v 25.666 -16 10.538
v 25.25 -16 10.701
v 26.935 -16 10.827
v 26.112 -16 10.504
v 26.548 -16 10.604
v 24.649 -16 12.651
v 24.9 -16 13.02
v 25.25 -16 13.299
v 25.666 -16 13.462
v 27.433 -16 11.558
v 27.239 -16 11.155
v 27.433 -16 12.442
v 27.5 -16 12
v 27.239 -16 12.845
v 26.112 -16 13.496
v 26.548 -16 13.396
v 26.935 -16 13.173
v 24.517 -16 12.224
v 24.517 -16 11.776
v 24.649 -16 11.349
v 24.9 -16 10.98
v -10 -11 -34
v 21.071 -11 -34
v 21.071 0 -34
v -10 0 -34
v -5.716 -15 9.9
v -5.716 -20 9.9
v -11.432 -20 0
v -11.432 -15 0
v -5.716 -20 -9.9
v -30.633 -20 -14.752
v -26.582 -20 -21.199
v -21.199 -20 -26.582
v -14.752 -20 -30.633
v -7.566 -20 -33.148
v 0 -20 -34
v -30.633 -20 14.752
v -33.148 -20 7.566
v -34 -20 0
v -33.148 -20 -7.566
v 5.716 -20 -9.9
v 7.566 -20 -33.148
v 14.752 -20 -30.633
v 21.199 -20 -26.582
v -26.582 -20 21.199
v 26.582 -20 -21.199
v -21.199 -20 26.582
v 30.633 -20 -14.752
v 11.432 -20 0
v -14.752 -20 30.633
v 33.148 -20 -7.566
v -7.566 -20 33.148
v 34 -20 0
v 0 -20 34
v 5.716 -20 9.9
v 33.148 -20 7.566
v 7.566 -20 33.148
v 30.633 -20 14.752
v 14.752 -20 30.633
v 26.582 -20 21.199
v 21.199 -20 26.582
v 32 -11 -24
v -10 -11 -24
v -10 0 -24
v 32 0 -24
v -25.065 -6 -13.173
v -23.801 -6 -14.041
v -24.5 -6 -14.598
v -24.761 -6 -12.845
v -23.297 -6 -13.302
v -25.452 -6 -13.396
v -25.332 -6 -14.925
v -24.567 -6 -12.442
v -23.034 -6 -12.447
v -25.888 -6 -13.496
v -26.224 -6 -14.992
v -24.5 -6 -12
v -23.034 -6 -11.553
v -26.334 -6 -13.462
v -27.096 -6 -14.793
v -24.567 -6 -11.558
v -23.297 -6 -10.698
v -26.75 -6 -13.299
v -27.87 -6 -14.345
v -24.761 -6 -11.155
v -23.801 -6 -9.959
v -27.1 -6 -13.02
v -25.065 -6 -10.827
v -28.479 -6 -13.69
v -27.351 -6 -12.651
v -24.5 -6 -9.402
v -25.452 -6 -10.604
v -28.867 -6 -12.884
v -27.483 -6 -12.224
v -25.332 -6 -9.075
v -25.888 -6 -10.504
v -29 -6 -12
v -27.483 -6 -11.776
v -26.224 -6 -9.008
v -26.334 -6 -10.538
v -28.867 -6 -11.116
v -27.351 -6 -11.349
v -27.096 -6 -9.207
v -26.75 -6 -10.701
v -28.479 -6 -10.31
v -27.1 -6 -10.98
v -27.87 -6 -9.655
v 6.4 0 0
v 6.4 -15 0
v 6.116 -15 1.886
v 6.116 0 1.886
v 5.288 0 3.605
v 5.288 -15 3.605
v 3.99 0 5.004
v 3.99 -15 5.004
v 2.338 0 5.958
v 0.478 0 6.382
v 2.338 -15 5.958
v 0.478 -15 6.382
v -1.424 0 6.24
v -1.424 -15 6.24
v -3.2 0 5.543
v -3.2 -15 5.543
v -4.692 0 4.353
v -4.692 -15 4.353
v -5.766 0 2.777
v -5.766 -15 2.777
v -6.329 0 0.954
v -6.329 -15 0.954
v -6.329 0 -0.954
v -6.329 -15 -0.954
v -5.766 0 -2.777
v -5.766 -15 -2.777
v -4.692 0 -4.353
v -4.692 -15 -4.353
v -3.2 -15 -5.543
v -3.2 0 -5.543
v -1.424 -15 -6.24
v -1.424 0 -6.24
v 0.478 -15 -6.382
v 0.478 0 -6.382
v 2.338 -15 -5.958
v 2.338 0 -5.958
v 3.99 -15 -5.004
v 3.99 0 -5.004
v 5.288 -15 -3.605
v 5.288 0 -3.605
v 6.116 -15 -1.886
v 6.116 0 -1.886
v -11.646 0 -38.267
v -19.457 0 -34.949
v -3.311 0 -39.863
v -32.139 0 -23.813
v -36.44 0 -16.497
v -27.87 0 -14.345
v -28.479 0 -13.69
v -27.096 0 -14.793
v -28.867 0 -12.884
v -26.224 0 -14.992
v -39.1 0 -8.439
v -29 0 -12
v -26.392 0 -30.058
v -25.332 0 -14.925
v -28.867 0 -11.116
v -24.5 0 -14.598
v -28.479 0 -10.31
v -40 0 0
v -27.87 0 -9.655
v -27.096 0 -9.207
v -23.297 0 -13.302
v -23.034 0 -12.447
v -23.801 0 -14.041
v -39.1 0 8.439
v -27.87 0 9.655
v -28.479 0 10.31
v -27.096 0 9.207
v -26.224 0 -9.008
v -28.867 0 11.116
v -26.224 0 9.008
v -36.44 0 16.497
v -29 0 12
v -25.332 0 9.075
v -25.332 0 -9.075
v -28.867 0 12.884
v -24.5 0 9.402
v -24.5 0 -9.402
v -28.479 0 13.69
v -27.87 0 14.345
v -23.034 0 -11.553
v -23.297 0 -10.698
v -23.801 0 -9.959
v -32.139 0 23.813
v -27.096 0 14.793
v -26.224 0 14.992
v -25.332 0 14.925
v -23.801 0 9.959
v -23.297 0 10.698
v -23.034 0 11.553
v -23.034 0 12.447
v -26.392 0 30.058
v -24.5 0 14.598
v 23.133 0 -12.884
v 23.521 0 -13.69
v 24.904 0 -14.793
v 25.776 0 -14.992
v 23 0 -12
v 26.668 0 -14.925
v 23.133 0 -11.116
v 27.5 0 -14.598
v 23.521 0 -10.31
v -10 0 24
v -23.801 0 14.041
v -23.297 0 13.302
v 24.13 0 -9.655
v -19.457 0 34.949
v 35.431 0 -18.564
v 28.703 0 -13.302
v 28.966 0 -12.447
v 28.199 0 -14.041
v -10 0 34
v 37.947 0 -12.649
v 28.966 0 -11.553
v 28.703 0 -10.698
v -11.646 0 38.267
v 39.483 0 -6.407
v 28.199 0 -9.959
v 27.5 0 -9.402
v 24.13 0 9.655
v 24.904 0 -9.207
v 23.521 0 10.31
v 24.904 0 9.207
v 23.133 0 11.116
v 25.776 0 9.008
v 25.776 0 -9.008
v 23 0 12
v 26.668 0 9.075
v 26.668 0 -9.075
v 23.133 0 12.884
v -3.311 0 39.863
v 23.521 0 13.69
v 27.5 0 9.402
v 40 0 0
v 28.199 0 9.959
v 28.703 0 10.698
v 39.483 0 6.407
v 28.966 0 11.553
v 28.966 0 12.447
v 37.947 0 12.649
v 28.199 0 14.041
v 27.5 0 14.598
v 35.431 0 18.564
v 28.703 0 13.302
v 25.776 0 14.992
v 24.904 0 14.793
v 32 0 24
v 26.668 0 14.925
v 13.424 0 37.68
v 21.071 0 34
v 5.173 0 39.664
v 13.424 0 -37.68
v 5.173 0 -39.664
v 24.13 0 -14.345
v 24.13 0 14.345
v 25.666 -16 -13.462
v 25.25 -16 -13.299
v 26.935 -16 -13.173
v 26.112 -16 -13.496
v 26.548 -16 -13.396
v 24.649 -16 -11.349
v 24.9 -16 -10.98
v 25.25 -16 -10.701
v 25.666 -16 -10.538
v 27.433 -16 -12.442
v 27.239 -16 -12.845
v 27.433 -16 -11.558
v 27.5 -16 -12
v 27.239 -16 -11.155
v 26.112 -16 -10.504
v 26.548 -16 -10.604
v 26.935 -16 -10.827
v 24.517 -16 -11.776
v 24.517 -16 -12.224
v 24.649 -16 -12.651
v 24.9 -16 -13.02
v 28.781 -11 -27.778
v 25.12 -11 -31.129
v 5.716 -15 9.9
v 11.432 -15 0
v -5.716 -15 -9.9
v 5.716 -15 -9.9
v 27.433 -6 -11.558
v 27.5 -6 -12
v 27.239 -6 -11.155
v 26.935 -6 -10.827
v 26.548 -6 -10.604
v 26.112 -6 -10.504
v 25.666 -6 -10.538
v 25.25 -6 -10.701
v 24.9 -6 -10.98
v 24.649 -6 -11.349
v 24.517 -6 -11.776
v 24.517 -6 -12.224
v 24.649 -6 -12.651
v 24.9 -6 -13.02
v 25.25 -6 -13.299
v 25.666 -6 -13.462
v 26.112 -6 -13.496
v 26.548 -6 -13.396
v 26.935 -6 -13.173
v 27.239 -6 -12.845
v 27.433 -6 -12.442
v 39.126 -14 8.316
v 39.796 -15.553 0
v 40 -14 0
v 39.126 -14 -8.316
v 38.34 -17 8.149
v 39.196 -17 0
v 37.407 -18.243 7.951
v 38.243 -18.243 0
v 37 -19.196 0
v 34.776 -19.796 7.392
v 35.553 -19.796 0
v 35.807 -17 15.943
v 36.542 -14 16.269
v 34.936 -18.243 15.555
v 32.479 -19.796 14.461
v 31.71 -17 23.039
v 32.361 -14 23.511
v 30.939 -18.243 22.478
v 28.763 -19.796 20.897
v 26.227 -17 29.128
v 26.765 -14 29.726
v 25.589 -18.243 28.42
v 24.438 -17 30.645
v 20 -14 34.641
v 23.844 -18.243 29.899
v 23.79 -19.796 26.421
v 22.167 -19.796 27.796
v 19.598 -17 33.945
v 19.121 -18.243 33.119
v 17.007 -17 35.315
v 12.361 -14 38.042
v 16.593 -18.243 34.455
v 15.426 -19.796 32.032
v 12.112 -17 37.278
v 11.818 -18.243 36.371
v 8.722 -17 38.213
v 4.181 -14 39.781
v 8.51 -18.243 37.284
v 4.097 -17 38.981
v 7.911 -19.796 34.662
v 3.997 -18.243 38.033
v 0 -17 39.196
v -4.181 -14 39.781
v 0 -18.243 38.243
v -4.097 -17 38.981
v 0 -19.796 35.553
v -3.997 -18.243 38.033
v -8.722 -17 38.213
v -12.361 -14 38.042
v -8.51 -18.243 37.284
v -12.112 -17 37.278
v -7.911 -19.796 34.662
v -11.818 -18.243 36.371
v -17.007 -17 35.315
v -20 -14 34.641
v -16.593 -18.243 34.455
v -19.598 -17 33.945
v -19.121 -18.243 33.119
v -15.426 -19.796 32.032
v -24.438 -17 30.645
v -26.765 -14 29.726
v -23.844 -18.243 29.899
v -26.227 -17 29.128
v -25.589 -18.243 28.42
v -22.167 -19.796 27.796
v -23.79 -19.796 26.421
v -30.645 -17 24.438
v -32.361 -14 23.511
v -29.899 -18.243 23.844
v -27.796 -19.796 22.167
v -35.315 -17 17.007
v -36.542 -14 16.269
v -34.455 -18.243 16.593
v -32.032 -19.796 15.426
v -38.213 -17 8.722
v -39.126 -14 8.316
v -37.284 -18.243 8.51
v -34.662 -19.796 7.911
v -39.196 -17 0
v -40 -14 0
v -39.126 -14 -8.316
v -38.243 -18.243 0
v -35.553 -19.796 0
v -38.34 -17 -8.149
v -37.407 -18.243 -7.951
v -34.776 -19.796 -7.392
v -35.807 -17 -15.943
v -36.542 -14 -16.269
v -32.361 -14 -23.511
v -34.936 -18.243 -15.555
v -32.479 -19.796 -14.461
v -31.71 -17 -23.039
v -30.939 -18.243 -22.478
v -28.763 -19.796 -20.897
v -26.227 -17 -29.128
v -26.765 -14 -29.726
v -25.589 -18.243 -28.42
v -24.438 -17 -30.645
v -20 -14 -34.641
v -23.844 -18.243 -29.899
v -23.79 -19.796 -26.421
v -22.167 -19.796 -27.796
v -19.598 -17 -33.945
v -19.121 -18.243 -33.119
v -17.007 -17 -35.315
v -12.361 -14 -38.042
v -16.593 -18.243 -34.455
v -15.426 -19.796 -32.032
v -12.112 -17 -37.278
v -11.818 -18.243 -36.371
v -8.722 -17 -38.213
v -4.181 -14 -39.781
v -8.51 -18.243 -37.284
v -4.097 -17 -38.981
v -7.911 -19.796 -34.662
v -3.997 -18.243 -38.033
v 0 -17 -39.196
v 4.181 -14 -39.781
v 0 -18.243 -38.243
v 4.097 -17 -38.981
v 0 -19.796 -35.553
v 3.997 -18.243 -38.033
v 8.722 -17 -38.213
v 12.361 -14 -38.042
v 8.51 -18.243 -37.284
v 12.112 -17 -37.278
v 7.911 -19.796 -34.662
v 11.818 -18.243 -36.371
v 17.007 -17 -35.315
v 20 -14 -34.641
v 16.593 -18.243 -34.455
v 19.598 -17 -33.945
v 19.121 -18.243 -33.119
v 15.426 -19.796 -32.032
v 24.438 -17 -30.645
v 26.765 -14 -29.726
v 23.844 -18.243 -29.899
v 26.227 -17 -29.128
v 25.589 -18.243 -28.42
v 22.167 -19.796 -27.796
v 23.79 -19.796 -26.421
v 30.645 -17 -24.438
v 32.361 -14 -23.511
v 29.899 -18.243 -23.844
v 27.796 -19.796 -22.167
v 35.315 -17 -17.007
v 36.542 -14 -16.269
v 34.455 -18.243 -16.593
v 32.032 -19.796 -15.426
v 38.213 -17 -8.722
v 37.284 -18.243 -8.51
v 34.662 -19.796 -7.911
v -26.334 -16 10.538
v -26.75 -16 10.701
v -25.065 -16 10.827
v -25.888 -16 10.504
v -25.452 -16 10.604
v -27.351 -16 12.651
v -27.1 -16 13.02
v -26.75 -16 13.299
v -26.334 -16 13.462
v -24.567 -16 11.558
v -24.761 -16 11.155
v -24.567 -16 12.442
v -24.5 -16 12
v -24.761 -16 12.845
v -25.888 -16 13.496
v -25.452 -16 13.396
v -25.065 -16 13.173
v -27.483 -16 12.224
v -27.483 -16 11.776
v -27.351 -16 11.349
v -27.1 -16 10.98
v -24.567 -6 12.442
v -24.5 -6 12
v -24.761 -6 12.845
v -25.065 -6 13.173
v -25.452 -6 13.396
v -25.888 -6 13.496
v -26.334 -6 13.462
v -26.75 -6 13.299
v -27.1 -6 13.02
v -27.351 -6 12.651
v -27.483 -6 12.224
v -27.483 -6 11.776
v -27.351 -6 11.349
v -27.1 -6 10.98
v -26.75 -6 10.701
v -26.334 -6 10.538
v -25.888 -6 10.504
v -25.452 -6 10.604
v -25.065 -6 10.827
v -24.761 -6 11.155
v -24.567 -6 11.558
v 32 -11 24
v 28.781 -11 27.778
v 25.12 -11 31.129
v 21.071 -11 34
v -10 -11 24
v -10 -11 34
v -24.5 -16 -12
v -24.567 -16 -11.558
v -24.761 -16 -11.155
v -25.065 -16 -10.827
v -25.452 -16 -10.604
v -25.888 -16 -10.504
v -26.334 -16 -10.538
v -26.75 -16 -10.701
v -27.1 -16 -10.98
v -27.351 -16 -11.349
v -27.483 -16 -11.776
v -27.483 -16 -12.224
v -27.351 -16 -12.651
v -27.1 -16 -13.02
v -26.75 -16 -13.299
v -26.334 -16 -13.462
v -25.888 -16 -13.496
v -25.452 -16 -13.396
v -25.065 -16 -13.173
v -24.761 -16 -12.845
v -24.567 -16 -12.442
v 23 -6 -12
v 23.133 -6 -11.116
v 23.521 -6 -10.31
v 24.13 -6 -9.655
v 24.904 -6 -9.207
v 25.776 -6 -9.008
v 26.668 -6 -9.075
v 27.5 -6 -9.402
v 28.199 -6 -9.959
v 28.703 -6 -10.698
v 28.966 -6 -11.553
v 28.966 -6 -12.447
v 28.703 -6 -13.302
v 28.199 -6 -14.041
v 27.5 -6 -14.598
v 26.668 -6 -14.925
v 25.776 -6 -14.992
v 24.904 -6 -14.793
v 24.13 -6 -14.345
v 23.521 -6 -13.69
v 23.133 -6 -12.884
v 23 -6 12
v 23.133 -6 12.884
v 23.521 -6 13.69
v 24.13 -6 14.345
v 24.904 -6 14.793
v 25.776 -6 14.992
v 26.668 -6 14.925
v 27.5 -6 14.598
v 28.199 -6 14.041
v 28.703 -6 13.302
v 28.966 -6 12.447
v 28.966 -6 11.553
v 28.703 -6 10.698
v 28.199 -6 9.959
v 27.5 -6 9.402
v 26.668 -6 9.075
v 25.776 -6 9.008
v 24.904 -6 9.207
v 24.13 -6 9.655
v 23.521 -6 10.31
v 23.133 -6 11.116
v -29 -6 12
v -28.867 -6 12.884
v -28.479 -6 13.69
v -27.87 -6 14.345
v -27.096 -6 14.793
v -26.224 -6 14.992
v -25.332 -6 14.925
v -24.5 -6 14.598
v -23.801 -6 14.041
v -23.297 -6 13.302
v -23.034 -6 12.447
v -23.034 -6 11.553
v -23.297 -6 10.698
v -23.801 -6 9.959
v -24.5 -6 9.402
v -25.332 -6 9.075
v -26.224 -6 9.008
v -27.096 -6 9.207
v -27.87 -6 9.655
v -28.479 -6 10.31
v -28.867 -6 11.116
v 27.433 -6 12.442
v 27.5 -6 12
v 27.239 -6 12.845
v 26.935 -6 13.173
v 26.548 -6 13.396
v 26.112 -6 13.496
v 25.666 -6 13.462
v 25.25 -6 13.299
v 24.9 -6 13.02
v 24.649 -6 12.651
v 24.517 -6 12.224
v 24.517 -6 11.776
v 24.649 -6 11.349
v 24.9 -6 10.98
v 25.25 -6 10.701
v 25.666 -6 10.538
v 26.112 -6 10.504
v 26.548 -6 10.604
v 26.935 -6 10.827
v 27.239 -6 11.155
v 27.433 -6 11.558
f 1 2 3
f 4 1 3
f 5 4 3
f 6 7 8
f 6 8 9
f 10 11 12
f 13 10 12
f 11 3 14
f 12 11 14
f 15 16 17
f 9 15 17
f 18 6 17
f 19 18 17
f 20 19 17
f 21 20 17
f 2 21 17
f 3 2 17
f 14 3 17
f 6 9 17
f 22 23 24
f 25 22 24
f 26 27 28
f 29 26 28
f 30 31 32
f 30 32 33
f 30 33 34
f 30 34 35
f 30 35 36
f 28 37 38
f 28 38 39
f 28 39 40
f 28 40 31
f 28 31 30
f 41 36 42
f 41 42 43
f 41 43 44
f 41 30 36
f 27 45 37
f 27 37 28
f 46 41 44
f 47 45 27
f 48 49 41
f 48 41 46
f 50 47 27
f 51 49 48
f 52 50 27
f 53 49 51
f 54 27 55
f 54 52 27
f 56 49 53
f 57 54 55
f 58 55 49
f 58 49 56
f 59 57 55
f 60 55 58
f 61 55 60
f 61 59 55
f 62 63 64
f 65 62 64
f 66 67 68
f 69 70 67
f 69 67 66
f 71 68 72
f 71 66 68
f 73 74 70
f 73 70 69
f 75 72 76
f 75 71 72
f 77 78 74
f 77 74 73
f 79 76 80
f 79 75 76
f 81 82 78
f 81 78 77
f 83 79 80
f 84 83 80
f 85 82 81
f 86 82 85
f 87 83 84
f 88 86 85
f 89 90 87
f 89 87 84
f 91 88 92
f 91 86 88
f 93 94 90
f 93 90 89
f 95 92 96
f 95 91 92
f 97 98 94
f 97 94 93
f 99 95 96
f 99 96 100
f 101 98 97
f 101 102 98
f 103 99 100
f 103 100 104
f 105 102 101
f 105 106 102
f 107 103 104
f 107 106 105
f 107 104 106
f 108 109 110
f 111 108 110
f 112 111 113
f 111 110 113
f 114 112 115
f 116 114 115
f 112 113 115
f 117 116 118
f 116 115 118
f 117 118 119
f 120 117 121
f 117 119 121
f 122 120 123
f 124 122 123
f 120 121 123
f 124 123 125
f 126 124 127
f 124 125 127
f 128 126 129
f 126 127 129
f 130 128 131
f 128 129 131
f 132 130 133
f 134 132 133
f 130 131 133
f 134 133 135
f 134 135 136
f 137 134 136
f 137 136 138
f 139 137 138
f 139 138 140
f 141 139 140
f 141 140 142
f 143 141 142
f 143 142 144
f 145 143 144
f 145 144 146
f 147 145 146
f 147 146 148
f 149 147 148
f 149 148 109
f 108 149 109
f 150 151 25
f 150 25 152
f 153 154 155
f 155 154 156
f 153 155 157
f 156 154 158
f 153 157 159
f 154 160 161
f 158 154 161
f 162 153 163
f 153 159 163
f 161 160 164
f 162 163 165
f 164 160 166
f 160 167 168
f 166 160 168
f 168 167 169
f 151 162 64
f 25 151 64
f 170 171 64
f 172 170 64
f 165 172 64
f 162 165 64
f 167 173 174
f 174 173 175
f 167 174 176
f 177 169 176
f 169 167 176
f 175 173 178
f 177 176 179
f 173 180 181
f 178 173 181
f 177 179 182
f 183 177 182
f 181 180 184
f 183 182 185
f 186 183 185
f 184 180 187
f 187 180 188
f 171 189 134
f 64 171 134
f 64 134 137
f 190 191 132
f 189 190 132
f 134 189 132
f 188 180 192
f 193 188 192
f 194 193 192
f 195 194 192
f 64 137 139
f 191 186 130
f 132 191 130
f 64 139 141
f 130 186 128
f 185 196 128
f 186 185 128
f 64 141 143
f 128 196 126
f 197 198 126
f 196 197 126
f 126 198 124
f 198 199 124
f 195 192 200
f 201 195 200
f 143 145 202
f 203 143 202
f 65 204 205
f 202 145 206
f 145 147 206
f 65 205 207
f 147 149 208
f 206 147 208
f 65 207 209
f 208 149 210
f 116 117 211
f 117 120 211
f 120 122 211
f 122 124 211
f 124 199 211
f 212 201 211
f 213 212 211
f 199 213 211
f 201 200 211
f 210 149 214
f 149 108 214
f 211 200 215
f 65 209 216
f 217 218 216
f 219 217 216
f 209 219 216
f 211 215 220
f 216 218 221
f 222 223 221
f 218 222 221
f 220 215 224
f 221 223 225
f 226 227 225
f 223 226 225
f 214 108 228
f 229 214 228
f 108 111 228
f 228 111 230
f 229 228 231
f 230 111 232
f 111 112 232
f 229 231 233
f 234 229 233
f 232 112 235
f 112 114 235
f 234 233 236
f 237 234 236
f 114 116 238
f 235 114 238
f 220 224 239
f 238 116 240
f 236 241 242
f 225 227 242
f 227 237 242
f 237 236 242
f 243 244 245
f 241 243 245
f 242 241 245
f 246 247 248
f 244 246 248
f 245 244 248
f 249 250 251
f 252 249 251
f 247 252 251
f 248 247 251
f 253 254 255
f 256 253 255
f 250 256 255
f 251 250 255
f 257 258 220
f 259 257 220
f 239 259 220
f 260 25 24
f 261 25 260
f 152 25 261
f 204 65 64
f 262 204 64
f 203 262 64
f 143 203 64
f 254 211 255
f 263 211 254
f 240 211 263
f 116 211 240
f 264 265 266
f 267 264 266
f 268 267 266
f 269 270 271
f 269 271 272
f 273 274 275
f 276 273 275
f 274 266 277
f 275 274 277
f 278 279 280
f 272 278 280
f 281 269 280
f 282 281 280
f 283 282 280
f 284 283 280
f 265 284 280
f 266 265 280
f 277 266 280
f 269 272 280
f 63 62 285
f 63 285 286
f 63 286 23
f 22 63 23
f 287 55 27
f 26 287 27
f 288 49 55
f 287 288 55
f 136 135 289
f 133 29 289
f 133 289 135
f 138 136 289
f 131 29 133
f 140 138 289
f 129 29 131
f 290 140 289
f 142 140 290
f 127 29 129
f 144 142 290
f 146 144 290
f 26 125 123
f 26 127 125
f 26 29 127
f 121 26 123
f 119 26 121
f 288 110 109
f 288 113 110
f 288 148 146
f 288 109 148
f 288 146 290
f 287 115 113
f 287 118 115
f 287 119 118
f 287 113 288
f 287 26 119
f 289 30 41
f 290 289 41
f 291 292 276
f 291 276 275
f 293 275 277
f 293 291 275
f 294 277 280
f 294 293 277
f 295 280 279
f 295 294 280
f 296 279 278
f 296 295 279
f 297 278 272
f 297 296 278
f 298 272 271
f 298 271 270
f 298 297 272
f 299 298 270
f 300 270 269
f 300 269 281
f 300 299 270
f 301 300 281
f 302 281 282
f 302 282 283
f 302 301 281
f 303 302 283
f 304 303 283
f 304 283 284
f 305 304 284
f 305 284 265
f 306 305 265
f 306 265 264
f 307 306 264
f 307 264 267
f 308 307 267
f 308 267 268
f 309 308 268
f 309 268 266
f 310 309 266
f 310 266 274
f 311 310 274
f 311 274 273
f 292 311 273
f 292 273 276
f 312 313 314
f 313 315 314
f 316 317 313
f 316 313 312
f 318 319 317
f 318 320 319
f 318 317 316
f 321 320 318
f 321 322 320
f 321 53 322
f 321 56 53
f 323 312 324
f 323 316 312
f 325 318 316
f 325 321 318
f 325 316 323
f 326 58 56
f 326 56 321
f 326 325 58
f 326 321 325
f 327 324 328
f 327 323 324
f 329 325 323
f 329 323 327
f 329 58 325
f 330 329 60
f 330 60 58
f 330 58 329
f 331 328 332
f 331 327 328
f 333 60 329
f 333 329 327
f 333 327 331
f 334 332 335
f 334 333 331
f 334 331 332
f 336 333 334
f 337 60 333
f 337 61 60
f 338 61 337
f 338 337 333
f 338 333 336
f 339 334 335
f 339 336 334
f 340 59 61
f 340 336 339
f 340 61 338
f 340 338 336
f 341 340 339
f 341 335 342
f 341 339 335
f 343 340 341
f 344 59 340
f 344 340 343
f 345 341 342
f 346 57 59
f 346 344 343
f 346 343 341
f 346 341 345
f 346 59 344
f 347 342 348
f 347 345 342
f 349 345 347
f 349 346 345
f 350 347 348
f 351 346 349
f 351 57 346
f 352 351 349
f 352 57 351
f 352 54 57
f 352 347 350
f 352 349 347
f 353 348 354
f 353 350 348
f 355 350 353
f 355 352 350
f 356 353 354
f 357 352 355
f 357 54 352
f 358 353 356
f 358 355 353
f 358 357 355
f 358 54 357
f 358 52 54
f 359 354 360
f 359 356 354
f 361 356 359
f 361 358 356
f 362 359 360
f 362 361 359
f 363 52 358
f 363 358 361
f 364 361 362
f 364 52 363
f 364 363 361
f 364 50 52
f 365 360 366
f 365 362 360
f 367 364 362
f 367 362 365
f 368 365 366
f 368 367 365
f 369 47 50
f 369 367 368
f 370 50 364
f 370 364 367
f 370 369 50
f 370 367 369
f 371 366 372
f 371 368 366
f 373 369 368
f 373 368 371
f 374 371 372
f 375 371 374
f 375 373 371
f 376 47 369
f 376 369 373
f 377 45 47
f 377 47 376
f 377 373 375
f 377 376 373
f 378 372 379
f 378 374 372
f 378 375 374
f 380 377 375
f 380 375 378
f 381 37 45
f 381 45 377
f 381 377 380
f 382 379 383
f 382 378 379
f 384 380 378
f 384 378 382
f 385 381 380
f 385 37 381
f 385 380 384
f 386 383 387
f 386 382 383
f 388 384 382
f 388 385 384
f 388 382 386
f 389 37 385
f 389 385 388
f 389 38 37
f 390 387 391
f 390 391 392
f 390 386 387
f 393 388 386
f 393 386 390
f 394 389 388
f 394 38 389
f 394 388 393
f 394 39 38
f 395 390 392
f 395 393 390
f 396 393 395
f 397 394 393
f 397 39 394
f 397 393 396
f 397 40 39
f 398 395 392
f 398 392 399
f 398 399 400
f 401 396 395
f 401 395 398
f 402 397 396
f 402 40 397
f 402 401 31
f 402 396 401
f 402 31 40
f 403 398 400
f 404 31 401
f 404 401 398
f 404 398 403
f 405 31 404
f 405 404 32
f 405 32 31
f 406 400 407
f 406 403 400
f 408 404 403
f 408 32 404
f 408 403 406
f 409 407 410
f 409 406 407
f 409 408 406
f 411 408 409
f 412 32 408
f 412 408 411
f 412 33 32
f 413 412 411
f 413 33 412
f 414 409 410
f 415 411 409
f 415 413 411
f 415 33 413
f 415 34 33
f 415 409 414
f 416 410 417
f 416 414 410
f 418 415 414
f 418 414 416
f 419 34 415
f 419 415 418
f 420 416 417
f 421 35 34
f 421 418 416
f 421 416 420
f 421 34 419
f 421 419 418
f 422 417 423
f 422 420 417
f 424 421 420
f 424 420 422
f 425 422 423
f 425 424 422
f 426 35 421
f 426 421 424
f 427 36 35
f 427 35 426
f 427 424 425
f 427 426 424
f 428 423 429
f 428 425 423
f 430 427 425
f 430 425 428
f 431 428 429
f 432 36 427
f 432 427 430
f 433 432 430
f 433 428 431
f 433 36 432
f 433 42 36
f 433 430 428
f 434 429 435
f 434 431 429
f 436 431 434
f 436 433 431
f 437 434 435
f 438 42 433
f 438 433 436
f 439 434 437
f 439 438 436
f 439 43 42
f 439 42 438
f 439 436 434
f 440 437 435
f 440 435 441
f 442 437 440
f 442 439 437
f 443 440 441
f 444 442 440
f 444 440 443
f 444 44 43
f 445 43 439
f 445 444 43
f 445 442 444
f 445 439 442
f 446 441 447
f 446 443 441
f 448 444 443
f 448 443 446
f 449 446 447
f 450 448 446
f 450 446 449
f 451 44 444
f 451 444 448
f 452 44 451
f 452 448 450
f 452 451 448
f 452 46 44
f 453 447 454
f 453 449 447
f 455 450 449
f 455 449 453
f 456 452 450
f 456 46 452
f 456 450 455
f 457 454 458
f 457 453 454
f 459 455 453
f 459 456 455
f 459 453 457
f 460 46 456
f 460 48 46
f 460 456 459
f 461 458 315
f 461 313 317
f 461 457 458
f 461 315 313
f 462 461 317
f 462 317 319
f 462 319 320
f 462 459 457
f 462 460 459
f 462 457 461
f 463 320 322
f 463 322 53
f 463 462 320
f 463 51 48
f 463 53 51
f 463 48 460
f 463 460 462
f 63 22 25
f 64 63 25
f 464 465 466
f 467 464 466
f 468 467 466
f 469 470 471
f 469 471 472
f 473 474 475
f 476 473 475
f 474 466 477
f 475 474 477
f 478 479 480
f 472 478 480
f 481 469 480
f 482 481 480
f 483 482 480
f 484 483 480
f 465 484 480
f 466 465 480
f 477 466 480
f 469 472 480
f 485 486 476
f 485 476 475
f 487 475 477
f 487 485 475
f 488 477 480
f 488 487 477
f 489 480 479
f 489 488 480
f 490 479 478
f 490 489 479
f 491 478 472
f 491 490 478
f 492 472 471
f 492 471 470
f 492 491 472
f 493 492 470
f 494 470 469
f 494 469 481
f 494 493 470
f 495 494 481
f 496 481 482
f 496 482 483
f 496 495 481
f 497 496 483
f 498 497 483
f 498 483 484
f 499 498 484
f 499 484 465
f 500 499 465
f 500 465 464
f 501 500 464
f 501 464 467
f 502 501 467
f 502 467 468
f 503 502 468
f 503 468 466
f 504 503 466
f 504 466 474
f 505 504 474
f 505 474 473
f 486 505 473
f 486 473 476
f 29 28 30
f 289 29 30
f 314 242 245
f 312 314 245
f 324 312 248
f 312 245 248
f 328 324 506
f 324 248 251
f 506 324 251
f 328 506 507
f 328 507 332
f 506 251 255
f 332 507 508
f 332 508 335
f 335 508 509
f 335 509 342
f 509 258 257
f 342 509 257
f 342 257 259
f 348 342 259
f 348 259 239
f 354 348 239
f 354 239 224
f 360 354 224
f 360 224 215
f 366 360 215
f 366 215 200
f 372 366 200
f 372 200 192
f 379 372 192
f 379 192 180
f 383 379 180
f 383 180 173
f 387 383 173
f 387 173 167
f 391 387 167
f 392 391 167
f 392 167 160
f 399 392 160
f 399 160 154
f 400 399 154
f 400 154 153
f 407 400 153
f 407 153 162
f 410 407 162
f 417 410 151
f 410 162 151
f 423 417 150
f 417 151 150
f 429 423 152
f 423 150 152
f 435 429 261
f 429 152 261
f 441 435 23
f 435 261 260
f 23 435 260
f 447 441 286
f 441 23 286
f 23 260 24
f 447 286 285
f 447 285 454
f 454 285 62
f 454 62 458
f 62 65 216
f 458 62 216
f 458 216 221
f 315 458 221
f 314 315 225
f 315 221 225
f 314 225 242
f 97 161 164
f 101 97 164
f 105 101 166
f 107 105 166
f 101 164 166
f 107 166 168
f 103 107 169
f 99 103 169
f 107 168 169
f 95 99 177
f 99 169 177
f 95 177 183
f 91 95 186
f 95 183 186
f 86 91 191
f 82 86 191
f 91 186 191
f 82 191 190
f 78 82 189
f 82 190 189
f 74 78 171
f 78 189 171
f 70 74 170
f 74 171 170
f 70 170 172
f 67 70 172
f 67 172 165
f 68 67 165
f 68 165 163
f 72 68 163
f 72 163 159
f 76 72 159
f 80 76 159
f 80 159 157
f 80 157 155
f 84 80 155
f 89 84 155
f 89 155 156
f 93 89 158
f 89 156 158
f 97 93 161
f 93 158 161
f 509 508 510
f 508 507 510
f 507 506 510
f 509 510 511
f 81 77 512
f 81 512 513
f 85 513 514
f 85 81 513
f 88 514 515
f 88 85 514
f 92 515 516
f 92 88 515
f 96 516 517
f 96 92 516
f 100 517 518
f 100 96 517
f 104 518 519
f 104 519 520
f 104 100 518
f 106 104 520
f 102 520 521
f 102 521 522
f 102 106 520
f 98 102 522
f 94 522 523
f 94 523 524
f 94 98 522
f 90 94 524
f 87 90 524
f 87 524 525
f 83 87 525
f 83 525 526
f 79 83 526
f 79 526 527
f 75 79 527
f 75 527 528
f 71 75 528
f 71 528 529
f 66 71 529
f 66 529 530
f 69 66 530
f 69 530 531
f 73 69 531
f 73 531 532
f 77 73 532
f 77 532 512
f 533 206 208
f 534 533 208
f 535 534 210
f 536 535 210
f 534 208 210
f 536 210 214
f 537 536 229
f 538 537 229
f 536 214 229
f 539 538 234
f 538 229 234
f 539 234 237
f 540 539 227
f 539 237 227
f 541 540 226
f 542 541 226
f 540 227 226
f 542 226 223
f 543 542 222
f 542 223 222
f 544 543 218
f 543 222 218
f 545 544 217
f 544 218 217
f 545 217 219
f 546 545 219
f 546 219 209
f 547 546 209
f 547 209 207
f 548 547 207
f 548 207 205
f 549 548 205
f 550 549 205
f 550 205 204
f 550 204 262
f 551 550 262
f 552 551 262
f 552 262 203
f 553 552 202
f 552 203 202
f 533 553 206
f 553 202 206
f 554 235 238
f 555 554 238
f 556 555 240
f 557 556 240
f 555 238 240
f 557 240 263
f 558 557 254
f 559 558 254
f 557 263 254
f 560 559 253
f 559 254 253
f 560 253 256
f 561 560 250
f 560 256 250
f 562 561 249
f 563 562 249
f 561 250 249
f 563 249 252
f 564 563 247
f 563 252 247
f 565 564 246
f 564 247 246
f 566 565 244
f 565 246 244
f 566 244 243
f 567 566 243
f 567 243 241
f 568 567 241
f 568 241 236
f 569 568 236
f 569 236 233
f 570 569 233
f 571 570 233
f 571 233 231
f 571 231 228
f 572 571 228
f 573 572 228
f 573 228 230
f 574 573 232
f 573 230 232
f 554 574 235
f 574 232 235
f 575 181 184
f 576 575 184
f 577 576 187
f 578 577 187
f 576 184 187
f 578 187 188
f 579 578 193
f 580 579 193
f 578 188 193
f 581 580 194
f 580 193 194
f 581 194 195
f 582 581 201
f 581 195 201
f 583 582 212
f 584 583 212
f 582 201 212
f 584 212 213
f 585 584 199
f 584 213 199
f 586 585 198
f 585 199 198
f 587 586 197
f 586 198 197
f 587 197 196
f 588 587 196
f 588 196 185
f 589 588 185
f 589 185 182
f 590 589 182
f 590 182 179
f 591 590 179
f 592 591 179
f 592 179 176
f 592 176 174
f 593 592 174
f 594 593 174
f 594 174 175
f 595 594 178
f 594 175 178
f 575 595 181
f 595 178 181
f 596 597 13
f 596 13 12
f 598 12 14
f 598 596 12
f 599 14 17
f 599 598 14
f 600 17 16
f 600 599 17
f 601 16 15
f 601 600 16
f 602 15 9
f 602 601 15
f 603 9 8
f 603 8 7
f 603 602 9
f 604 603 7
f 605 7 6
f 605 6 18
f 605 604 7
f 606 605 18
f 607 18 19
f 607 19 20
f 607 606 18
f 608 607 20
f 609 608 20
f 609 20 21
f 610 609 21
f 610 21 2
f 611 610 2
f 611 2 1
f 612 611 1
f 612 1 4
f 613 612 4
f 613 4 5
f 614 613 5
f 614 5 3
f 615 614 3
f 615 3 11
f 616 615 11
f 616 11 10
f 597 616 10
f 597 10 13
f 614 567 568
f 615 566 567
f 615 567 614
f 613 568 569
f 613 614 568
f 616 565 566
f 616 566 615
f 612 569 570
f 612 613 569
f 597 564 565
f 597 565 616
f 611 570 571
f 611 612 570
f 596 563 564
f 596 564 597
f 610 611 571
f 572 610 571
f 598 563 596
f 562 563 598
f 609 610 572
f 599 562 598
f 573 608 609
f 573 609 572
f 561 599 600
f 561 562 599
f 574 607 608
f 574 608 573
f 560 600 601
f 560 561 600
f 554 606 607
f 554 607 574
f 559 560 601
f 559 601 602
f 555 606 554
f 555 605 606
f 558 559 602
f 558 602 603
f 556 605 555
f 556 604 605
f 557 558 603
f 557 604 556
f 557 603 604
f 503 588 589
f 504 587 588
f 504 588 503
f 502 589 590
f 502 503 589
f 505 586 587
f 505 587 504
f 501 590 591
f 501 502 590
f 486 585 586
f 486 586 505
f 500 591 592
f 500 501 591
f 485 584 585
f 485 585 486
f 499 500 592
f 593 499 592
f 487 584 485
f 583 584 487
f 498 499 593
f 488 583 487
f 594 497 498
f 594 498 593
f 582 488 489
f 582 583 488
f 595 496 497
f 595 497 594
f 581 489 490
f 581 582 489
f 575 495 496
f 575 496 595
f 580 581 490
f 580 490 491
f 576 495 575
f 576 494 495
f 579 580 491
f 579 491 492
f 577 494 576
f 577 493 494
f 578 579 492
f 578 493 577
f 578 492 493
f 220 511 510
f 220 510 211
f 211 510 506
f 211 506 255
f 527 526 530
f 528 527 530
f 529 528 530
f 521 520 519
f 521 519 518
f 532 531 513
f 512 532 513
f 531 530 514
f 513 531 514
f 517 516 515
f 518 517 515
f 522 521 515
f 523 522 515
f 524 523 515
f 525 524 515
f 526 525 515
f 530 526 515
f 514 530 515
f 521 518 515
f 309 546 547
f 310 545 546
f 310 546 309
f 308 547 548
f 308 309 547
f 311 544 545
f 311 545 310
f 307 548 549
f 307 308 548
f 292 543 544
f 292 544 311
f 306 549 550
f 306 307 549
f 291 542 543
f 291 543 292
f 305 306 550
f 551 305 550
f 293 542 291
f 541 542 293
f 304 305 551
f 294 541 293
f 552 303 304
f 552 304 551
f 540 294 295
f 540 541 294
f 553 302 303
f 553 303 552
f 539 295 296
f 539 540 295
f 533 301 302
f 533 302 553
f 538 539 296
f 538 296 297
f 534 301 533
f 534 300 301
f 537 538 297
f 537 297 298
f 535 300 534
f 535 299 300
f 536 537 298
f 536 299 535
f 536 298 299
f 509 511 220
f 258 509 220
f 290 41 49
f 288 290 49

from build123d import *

# Parameters (mm, degrees)
F0_R          = 40
F1_DEPTH      = 20
F2_W          = 11
F2_H          = 10
F3_DEPTH      = 50
F3_DEPTH_BACK = 10
F4_R          = 6
F6_DEPTH      = 5
F7_R          = 6.4
F8_DEPTH      = 25
F9_R          = 1.5
F10_DEPTH     = 16
F11_R         = 3
F12_DEPTH     = 6


# Not quite as in the source:
# - a pattern or mirror of a feature is missing from the dataset's text; its kind, count and spacing are read off the source's solid


with BuildPart() as f1:
    # F0 (on Front) → F1 (new body)
    with BuildSketch(Plane.XZ):
        Circle(F0_R)
    extrude(amount=F1_DEPTH)

    # F2 (on Right) → F3 (cut, two sides)
    with BuildSketch(Plane.YZ) as f3_sk:
        with Locations((-5.5, 29)):
            Rectangle(F2_W, F2_H)
    f3 = extrude(amount=F3_DEPTH, mode=Mode.SUBTRACT) + extrude(f3_sk.sketch, amount=-F3_DEPTH_BACK, mode=Mode.SUBTRACT)

    # F3_copies: F3 across plane
    add(f3.mirror(Plane(origin=(0, 0, 0), x_dir=(-1, 0, 0), z_dir=(0, 0, -1))), mode=Mode.SUBTRACT)

    # F4
    f4_edges = [f1.edges().sort_by_distance(p)[0] for p in [
        (-40, -20, 0),
    ]]
    fillet(f4_edges, radius=F4_R)

    # F5 (on face) → F6 (cut)
    with BuildSketch(Plane.XZ.offset(20)):
        Polygon((-5.715767665, -9.9), (5.715767665, -9.9), (11.43153533, 0), (5.715767665, 9.9), (-5.715767665, 9.9), (-11.43153533, 0), align=None)
    extrude(amount=-F6_DEPTH, mode=Mode.SUBTRACT)

    # F7 (on face) → F8 (cut)
    with BuildSketch(Plane.XZ.offset(15)):
        Circle(F7_R)
    extrude(amount=-F8_DEPTH, mode=Mode.SUBTRACT)

    # F9 (on Front) → F10 (cut)
    with BuildSketch(Plane.XZ):
        with Locations((26, 12)):
            Circle(F9_R)
        with Locations((-26, 12)):
            Circle(F9_R)
        with Locations((-26, -12)):
            Circle(F9_R)
        with Locations((26, -12)):
            Circle(F9_R)
    extrude(amount=F10_DEPTH, mode=Mode.SUBTRACT)

    # F11 (on face) → F12 (cut)
    with BuildSketch(Plane(origin=(0, 0, 0), x_dir=(-1, 0, 0), z_dir=(0, 1, 0))):
        with Locations((-26, 12)):
            Circle(F11_R)
        with Locations((26, 12)):
            Circle(F11_R)
        with Locations((26, -12)):
            Circle(F11_R)
        with Locations((-26, -12)):
            Circle(F11_R)
    extrude(amount=-F12_DEPTH, mode=Mode.SUBTRACT)


solid = f1.part
